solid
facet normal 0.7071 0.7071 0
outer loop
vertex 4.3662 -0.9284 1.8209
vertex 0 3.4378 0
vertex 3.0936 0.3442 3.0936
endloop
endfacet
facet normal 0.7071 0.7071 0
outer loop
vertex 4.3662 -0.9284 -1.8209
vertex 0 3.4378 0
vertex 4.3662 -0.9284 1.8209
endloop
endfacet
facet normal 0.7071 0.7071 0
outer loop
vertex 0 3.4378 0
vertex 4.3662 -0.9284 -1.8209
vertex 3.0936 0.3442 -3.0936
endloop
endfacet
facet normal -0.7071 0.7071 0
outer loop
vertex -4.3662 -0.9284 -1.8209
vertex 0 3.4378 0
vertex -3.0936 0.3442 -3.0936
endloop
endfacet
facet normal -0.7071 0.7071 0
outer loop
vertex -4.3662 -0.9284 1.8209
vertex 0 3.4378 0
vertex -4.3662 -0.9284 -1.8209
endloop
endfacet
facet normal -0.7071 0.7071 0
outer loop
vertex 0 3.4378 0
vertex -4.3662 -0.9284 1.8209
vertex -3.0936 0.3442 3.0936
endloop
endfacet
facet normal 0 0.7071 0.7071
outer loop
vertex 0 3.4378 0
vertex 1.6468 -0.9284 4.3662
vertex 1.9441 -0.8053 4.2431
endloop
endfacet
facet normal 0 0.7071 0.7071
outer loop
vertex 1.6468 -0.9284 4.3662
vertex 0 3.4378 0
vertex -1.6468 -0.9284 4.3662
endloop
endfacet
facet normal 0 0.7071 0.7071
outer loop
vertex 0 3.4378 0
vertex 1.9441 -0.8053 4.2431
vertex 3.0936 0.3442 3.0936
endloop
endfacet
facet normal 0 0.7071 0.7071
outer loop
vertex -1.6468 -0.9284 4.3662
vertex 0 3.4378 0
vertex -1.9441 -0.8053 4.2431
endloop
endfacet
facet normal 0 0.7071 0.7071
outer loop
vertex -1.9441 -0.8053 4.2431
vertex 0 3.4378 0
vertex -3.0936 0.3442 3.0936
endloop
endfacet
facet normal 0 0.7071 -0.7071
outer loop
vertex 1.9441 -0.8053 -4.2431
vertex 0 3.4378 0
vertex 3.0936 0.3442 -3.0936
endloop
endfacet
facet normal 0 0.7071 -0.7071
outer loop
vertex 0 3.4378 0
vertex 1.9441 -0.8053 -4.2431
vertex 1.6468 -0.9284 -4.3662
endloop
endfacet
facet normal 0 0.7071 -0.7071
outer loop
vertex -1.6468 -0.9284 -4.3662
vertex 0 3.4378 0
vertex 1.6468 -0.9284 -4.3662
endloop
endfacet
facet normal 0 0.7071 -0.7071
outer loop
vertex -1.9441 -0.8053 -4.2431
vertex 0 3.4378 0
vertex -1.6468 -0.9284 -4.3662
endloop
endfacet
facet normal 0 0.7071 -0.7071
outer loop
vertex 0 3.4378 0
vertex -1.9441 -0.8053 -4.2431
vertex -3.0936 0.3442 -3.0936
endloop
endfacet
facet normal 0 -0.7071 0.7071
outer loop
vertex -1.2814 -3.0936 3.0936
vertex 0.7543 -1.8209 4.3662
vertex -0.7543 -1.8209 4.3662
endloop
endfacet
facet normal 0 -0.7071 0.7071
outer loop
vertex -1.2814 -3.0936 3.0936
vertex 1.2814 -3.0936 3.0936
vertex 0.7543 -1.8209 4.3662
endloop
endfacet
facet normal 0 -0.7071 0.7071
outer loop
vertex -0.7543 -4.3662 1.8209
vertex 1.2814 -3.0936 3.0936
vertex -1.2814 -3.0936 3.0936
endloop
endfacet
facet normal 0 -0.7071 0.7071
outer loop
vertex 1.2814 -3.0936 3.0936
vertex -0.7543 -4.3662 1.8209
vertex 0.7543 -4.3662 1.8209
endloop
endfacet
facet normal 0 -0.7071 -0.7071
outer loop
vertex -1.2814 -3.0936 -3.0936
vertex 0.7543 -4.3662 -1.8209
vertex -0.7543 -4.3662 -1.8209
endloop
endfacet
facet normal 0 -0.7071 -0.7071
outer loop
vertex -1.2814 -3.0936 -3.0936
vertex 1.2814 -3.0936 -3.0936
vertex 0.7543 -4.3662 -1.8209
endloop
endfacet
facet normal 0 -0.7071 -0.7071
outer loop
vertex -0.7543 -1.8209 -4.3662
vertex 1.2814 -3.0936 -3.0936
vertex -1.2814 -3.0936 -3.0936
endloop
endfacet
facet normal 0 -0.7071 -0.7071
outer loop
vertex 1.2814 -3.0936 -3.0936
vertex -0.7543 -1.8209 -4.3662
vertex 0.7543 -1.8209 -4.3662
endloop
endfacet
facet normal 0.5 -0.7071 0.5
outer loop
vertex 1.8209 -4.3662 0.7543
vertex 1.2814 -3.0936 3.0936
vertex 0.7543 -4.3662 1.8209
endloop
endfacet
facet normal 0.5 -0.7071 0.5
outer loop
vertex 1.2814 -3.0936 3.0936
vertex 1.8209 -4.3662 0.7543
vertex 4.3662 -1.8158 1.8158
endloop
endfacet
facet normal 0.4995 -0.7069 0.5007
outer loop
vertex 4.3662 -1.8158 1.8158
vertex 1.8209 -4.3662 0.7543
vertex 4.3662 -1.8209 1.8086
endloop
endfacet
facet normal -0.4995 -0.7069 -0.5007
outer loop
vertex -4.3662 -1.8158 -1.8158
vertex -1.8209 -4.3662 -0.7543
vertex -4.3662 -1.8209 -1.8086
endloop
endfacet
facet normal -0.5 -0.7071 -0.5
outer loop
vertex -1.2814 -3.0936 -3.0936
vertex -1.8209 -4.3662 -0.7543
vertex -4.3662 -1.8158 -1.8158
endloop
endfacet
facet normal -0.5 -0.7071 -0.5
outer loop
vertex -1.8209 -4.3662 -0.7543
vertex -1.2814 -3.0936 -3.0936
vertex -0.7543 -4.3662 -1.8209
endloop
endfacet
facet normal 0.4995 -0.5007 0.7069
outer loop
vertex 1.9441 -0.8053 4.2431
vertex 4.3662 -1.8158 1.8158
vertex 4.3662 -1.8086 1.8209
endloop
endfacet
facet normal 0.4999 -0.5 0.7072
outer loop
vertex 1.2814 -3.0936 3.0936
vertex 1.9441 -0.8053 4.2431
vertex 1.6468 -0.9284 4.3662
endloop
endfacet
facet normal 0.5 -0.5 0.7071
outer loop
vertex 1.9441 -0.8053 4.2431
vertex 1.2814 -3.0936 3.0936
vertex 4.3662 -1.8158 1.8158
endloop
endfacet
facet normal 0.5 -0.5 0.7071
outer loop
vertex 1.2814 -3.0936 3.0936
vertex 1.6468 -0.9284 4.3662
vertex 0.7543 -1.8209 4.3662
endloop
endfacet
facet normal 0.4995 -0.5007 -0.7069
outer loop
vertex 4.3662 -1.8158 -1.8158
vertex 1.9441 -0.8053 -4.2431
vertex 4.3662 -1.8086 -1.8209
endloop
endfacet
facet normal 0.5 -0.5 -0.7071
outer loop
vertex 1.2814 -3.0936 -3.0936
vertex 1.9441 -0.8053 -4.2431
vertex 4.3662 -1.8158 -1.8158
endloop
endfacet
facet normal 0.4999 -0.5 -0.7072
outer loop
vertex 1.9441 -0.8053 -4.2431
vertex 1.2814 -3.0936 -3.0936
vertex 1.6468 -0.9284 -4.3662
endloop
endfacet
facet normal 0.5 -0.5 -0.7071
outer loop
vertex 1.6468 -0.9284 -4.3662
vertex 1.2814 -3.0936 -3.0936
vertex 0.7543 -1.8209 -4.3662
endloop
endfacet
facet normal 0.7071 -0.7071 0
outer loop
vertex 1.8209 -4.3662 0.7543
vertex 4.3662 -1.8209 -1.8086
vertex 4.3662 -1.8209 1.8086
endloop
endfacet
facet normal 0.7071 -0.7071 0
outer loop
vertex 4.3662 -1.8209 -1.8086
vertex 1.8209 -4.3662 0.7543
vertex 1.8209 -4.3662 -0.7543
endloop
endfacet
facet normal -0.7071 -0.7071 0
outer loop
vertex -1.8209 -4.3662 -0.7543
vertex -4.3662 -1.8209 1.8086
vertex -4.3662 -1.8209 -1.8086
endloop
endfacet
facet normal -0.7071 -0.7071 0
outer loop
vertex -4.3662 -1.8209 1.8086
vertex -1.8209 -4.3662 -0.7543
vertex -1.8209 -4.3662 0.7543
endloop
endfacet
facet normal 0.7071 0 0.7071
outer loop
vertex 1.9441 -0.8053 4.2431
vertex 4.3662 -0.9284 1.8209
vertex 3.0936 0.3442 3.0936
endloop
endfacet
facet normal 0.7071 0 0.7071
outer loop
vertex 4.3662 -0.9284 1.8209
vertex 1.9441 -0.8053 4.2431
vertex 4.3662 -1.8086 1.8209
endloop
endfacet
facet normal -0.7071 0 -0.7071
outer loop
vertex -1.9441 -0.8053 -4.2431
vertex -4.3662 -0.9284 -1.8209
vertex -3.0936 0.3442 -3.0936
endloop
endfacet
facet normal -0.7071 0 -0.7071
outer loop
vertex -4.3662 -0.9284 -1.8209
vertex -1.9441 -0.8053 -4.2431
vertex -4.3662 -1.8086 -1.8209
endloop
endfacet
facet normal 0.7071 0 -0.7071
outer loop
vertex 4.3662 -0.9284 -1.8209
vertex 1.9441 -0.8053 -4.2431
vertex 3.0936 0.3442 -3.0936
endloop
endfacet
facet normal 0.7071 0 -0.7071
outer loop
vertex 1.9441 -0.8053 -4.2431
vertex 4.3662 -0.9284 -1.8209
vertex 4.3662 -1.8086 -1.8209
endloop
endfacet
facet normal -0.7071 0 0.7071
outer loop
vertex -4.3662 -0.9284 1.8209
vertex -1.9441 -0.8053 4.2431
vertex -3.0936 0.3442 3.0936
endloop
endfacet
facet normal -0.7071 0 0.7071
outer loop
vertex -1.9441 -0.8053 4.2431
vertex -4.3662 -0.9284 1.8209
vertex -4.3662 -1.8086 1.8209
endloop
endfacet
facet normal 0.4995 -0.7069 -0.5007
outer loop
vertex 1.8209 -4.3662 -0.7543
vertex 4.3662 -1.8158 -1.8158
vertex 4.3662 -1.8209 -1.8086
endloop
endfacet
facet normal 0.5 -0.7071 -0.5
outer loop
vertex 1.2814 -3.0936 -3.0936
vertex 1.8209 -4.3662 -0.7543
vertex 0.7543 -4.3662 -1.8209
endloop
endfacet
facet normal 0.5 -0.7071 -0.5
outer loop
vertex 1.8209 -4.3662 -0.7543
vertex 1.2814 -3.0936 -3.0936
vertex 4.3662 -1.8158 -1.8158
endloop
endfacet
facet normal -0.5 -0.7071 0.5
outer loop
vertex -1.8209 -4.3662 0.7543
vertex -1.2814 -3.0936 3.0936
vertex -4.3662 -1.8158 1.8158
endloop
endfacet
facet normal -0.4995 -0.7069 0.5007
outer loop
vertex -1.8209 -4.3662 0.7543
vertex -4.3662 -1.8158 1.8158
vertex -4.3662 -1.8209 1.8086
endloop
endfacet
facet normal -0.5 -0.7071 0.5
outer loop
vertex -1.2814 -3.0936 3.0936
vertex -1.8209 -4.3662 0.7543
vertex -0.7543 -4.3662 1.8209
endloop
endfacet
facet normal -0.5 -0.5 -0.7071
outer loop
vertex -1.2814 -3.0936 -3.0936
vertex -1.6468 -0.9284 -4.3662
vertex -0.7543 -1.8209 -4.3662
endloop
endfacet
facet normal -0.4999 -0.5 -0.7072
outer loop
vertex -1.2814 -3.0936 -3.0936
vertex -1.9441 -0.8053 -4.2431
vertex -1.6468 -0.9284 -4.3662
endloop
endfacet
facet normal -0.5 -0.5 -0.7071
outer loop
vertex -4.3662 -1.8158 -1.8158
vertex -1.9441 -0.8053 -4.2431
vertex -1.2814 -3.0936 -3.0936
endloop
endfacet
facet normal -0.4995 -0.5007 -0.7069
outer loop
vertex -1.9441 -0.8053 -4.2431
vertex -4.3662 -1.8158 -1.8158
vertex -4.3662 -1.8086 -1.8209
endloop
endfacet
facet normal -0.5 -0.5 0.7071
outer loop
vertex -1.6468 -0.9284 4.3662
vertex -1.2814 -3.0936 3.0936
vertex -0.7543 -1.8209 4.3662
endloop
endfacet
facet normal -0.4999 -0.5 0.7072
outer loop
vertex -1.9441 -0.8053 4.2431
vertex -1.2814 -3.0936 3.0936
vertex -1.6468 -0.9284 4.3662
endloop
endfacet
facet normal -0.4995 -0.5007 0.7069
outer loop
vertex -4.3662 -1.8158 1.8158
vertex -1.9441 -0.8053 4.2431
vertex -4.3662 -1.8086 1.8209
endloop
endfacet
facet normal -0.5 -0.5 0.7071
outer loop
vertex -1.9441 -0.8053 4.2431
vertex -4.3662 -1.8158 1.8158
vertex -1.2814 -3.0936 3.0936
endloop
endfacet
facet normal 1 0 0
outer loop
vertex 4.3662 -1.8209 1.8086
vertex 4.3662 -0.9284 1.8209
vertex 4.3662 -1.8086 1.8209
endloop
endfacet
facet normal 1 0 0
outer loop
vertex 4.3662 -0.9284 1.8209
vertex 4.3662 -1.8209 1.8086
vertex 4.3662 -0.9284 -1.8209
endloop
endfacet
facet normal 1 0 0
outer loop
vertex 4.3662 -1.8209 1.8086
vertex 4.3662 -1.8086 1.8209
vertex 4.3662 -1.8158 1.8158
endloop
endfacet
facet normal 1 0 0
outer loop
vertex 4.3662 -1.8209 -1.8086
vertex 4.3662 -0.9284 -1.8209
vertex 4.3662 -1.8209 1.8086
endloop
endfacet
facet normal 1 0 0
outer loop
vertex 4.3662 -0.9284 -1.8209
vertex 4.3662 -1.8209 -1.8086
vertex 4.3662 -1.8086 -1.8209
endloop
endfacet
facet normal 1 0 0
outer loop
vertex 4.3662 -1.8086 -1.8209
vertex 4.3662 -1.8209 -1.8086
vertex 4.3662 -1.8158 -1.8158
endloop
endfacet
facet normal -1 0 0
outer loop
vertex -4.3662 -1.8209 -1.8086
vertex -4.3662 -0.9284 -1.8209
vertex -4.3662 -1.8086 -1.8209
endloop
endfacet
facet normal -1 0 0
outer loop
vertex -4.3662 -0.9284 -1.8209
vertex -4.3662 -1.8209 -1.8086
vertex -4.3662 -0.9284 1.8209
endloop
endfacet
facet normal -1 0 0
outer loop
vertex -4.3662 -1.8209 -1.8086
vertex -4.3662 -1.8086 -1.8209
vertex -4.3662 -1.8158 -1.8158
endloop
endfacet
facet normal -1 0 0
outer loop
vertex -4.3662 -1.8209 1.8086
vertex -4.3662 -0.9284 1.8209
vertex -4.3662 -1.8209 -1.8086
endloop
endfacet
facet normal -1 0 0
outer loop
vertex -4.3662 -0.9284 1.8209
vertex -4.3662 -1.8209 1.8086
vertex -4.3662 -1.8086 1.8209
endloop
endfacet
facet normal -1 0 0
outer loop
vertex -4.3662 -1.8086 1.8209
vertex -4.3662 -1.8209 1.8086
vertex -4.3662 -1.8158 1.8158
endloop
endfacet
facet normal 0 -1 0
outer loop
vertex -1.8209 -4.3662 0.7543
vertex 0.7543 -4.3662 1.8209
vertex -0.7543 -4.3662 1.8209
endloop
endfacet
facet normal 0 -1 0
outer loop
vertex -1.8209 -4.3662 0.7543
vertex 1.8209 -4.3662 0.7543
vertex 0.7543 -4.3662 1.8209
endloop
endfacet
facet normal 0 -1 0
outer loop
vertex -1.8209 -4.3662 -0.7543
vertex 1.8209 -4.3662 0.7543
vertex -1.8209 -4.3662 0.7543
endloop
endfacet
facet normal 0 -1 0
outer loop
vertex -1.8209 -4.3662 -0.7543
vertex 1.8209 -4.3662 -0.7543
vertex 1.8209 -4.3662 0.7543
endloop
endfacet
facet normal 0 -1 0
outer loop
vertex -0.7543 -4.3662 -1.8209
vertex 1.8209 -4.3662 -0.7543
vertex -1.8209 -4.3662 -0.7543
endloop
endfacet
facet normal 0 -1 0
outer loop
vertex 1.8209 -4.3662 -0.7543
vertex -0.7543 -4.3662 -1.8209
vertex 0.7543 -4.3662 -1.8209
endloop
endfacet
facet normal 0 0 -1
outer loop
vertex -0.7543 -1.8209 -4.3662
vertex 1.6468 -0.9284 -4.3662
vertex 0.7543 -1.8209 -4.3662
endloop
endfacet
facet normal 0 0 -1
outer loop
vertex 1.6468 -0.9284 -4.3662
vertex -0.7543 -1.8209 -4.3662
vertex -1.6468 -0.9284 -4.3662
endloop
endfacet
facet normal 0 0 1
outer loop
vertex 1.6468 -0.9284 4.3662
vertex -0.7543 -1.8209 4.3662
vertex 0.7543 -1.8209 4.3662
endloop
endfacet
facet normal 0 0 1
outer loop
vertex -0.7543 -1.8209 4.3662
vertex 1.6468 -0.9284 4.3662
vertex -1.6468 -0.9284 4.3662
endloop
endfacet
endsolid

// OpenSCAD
$fn=20;

washer_r_i=10;
washer_width=5;
washer_height=1;
bowl_r_i = 4;
bowl_width=.5;
bowl_height=3.5;

gem_side_length=2.5*(bowl_r_i-bowl_width);
gem_angle = 45;
gem_height=6/5*gem_side_length*4*gem_angle/360;

gem_side_length=2.5*(bowl_r_i-bowl_width);
gem_angle = 45;
gem_height=6/5*gem_side_length*4*gem_angle/360;

module donut(r_i, height) {
  translate([0, 0, height/2 - r_i/4])
    rotate_extrude(convexity=10) {
      translate([r_i+height/2,0,0])circle(r=height/2, center=true);
    }
}

module washer(r_i, width, height) {
  // edges
  donut(r_i, height);
  translate([0, 0, width-height])donut(r_i, height);
  // center
  difference() {
    cylinder(r=r_i+height, h=width-height, center=true);
    cylinder(r=r_i, h=width-height, center=true);
  }
} 

module bowl(r_i, height, width, n_legs, twist) {
  for (pos=[0:360/n_legs:360]) {
    rotate([0, 0, pos])
      linear_extrude(height=height, center = false, convexity = 10, twist = twist)
        translate([0,r_i,0])circle(r=width, center=true, $fn=5);
  }
}

module gem_mold(side_length, angle) {
  difference() {
    cube([side_length, side_length, side_length], center=true, $fn=1);
    rotate([angle, 0, 0])cube([side_length, side_length, side_length], center=true, $fn=1);
  }
}

module gem_base(side_length, height, angle) {
  // make the bottom half of a base in the shape of a tetrahedron
  difference() {
    cube([side_length, side_length, side_length+height], center=true, $fn=1);
    for (ang2=[0,90]) {
      rotate([0, 0, ang2]) {
        translate([side_length/2, 0, 0])rotate([0, angle, 0])
          cube([side_length, side_length, side_length], center=true, $fn=1);
        translate([-side_length/2, 0, 0])rotate([0, -angle, 0])
          cube([side_length, side_length, side_length], center=true, $fn=1);
      }
    }
    // hack to openscad junk (remove bottom) probably makes this not parametric and might cut off important parts
    translate([0, 0, -height])cube([side_length*1.1,side_length*1.1,height*1.1], center=true, $fn=1);
  }
}

module gemstone(side_length, height, angle) {
  difference() {
    union() {
      difference() {
        cube([side_length, side_length, side_length], center=true, $fn=1);
        // cut off base
        translate([0, .5*height, 0])
          cube([side_length, side_length, side_length], center=true, $fn=1);
      }
      // add better base
      translate([0, height, 0])rotate([90, 0, 0])
        gem_base(gem_side_length, height, angle);
    }
    // crown
    for (ang = [0: angle: 180 - angle]) {
      rotate([ang, 0, 0])gem_mold(side_length, angle);
      rotate([0, ang, 0])gem_mold(side_length, angle);
      rotate([0, 0, ang])gem_mold(side_length, angle);
    }
  // hack: remove junk probably due to openscad bug
  translate([.999*side_length, 0, 0])cube([side_length, side_length, side_length], center=true, $fn=1);
  translate([.999*-side_length, 0, 0])cube([side_length, side_length, side_length], center=true, $fn=1);
  translate([0, .999*side_length, 0])cube([side_length, side_length, side_length], center=true, $fn=1);
  translate([0, .999*-side_length, 0])cube([side_length, side_length, side_length], center=true, $fn=1);
  translate([0, 0, .999*-side_length])cube([side_length, side_length, side_length], center=true, $fn=1);
  translate([0, 0, .999*side_length])cube([side_length, side_length, side_length], center=true, $fn=1);
  }
}


module ring() {
  // ring body
  rotate([0, 90, 0])
    washer(washer_r_i, washer_width, washer_height);
  // gem holder
  translate([0, 0, washer_r_i]) {
    scale([.75, .999, 1]) // TODO: set scale as scale([1, bowl_height, bowl_width])
    rotate([0, 0, 45]) {
      cylinder(r=bowl_r_i+.5*bowl_width, h=washer_height);
      bowl(bowl_r_i, bowl_height, bowl_width, n_legs=10, twist=180/3);
      bowl(bowl_r_i, bowl_height, bowl_width, n_legs=8, twist=-180/3);
    }
    // gem stone
    difference() {
      translate([0, 0, gem_height/3])rotate([360-90, 0, 90])
        gemstone(gem_side_length, gem_height, gem_angle);
      // remove any piece of gemstone that may hit finger
      translate([0, 0, -gem_side_length*.5])cube([gem_side_length, gem_side_length, gem_side_length], center=true);
    }
  }
}

/*rotate([0, 180, 0])ring();*/
gemstone(gem_side_length, gem_height, gem_angle);
